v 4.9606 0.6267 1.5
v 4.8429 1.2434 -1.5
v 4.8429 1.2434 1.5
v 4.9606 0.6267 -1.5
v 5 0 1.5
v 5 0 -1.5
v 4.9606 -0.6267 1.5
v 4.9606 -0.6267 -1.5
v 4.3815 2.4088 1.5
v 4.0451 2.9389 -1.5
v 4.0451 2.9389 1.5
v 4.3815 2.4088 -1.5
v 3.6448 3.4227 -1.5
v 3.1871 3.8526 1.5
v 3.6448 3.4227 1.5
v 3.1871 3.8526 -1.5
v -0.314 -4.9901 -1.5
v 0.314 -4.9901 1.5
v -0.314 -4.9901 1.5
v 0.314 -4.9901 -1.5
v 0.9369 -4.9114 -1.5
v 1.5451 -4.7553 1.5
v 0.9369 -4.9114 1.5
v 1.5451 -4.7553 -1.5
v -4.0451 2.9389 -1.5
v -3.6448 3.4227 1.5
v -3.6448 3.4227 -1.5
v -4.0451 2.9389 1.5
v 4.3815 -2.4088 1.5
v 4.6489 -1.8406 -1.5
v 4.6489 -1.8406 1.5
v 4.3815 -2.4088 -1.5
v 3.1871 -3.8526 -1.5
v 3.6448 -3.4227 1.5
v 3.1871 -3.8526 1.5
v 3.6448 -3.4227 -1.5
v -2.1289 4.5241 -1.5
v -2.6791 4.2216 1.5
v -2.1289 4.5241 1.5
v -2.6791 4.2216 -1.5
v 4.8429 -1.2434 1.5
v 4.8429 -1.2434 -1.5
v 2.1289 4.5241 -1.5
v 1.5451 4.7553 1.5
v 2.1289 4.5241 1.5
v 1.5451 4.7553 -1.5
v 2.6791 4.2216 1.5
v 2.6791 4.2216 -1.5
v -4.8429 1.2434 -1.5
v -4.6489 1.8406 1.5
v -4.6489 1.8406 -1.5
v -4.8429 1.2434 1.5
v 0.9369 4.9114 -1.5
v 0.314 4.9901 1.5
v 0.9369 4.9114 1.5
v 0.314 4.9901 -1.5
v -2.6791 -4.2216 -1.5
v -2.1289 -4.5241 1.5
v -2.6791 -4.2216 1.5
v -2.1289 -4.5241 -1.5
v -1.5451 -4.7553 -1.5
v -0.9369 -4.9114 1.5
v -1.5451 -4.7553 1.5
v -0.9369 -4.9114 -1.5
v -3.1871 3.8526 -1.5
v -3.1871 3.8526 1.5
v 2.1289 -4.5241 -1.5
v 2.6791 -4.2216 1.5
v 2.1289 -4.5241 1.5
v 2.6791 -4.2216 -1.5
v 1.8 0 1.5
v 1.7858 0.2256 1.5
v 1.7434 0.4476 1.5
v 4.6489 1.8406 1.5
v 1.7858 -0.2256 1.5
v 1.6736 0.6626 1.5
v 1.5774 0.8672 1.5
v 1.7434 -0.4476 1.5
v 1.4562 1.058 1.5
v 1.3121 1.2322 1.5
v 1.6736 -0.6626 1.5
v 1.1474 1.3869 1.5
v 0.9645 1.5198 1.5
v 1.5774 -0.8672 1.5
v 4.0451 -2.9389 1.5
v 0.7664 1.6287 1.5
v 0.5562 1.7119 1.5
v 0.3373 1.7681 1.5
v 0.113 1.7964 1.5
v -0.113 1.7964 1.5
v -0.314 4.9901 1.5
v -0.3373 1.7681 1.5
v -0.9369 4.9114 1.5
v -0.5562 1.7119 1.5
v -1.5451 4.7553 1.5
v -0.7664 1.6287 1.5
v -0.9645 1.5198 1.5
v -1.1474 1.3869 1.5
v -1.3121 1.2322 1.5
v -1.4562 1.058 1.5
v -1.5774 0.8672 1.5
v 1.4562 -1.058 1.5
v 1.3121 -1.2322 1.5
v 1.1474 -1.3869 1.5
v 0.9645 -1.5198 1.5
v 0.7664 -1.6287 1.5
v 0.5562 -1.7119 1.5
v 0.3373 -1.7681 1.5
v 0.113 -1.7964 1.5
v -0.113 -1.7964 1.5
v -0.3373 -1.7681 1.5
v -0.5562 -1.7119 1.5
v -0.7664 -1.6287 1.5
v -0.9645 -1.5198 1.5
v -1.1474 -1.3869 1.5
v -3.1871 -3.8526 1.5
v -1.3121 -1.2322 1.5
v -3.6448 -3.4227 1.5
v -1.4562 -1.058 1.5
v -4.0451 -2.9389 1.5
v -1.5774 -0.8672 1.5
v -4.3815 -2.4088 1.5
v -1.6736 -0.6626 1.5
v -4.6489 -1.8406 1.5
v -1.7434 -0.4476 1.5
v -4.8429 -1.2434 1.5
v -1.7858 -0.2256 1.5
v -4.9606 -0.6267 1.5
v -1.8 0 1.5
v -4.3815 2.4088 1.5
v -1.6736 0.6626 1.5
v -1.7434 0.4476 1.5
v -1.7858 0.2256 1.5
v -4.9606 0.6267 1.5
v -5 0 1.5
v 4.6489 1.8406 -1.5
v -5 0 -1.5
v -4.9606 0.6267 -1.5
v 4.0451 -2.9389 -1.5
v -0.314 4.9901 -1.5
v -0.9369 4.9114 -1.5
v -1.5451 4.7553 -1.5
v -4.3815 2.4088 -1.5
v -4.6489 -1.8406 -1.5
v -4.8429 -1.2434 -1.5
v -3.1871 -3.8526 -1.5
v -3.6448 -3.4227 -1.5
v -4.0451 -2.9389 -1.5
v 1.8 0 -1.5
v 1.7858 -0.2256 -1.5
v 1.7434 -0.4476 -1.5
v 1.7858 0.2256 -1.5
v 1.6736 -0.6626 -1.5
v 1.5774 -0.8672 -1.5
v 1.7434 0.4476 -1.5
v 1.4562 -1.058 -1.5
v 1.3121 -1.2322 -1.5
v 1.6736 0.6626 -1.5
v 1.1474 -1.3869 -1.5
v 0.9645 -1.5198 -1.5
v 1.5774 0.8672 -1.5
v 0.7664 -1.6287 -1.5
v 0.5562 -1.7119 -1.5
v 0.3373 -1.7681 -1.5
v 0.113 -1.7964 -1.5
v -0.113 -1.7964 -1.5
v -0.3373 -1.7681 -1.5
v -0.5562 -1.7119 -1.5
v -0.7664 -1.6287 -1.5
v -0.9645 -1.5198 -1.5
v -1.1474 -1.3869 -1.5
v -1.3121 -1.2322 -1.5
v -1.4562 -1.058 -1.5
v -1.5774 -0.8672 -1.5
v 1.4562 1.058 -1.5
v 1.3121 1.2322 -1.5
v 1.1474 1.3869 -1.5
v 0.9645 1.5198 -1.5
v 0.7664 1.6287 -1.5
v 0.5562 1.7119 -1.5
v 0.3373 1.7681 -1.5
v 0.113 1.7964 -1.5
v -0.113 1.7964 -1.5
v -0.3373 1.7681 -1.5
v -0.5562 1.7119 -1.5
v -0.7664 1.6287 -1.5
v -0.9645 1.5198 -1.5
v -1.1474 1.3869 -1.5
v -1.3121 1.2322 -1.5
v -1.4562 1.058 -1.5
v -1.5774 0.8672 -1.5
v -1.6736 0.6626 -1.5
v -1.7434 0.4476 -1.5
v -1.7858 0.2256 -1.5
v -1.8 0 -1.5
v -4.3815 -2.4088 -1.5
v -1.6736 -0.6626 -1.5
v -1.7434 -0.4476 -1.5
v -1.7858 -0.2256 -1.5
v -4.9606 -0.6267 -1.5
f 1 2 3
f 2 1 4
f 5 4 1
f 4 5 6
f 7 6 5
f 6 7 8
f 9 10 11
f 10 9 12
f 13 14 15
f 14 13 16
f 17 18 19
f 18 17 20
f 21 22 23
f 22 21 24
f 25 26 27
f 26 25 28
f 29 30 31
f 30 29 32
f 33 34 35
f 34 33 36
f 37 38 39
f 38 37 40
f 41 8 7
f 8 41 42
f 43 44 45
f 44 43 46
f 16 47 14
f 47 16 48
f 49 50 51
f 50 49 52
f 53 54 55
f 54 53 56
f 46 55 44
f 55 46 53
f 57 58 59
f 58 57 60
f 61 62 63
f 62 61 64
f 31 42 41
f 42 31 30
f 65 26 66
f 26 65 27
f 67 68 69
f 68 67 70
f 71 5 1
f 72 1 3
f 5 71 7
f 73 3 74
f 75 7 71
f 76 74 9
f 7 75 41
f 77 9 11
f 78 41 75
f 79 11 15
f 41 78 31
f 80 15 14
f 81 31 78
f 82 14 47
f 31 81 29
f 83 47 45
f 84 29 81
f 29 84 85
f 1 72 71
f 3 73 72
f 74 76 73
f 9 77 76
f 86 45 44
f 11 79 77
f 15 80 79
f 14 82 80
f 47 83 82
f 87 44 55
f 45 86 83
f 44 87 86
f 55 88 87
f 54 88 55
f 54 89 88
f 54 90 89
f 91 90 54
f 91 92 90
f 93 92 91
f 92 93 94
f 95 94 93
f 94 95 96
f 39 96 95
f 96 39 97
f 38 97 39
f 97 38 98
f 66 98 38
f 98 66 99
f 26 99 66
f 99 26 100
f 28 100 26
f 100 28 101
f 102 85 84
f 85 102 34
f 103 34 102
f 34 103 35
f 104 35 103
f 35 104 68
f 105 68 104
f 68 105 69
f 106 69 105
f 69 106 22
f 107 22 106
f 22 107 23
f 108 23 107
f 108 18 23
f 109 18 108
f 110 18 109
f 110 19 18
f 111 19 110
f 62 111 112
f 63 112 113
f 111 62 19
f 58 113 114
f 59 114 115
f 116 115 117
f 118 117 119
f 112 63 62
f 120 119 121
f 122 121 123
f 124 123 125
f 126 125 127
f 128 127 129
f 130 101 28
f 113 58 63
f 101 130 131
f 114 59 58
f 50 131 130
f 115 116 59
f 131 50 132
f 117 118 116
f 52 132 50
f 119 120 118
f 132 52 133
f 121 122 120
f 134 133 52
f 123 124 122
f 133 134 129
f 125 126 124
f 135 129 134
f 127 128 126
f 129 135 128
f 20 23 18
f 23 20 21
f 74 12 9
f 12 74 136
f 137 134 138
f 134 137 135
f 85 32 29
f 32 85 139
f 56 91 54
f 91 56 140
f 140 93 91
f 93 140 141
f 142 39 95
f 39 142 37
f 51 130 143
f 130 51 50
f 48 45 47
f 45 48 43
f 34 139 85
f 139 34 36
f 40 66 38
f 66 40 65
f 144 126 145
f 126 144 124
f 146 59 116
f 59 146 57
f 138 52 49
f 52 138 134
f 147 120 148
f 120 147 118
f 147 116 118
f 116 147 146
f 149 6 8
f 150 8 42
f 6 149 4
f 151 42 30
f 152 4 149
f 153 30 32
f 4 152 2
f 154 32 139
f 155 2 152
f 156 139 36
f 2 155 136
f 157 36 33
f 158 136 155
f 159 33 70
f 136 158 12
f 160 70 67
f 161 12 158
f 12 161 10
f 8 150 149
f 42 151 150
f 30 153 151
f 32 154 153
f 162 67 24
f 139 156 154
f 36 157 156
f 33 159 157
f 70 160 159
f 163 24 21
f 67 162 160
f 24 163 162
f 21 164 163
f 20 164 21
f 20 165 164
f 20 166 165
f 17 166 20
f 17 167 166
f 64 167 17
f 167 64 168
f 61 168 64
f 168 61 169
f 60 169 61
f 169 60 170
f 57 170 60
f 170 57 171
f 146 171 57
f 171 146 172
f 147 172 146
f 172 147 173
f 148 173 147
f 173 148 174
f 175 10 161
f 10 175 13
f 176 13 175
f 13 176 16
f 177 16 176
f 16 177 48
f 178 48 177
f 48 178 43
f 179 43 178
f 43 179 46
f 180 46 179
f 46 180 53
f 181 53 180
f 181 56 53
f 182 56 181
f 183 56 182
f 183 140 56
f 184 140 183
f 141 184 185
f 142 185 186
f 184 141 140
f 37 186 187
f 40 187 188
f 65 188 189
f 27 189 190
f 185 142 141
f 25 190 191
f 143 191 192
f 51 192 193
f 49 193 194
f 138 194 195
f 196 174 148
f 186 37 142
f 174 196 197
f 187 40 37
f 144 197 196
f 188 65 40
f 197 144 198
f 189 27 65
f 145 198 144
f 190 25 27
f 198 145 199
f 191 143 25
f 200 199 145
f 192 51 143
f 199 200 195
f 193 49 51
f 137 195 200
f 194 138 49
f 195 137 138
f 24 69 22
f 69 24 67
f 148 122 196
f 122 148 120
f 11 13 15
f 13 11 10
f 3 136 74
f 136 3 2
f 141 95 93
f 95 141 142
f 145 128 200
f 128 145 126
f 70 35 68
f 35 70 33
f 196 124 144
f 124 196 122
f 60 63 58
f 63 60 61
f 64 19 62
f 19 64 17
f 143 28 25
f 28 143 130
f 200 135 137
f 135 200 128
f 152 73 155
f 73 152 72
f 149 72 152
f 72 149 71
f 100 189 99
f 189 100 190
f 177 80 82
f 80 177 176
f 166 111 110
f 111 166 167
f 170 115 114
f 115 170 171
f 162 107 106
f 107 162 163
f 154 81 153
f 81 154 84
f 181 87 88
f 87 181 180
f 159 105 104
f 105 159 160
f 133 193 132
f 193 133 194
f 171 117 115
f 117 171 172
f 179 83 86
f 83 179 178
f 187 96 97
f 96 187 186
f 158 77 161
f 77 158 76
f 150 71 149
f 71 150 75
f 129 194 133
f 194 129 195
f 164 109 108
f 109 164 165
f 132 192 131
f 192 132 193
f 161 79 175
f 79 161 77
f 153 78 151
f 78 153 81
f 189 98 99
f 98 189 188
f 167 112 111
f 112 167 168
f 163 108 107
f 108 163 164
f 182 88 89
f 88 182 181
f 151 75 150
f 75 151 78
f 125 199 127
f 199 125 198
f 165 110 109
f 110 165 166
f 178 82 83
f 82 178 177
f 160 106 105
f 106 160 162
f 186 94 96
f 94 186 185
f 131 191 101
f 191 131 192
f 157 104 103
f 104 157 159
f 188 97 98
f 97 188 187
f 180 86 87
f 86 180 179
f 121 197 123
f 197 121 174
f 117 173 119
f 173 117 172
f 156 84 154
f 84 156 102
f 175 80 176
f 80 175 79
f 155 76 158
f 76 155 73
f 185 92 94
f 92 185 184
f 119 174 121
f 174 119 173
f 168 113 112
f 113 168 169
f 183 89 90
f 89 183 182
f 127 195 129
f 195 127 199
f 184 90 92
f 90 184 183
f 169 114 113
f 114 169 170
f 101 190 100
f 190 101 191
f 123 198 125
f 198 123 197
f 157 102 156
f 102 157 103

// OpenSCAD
$fn = 50;


difference() {
	union() {
		translate(v = [0, 0, -1.5000000000]) {
			cylinder(h = 3, r = 5.0000000000);
		}
		translate(v = [0, 0, -1.5000000000]) {
			cylinder(h = 3, r = 2.8500000000);
		}
	}
	union() {
		translate(v = [0, 0, -100.0000000000]) {
			cylinder(h = 200, r = 1.8000000000);
		}
	}
}
